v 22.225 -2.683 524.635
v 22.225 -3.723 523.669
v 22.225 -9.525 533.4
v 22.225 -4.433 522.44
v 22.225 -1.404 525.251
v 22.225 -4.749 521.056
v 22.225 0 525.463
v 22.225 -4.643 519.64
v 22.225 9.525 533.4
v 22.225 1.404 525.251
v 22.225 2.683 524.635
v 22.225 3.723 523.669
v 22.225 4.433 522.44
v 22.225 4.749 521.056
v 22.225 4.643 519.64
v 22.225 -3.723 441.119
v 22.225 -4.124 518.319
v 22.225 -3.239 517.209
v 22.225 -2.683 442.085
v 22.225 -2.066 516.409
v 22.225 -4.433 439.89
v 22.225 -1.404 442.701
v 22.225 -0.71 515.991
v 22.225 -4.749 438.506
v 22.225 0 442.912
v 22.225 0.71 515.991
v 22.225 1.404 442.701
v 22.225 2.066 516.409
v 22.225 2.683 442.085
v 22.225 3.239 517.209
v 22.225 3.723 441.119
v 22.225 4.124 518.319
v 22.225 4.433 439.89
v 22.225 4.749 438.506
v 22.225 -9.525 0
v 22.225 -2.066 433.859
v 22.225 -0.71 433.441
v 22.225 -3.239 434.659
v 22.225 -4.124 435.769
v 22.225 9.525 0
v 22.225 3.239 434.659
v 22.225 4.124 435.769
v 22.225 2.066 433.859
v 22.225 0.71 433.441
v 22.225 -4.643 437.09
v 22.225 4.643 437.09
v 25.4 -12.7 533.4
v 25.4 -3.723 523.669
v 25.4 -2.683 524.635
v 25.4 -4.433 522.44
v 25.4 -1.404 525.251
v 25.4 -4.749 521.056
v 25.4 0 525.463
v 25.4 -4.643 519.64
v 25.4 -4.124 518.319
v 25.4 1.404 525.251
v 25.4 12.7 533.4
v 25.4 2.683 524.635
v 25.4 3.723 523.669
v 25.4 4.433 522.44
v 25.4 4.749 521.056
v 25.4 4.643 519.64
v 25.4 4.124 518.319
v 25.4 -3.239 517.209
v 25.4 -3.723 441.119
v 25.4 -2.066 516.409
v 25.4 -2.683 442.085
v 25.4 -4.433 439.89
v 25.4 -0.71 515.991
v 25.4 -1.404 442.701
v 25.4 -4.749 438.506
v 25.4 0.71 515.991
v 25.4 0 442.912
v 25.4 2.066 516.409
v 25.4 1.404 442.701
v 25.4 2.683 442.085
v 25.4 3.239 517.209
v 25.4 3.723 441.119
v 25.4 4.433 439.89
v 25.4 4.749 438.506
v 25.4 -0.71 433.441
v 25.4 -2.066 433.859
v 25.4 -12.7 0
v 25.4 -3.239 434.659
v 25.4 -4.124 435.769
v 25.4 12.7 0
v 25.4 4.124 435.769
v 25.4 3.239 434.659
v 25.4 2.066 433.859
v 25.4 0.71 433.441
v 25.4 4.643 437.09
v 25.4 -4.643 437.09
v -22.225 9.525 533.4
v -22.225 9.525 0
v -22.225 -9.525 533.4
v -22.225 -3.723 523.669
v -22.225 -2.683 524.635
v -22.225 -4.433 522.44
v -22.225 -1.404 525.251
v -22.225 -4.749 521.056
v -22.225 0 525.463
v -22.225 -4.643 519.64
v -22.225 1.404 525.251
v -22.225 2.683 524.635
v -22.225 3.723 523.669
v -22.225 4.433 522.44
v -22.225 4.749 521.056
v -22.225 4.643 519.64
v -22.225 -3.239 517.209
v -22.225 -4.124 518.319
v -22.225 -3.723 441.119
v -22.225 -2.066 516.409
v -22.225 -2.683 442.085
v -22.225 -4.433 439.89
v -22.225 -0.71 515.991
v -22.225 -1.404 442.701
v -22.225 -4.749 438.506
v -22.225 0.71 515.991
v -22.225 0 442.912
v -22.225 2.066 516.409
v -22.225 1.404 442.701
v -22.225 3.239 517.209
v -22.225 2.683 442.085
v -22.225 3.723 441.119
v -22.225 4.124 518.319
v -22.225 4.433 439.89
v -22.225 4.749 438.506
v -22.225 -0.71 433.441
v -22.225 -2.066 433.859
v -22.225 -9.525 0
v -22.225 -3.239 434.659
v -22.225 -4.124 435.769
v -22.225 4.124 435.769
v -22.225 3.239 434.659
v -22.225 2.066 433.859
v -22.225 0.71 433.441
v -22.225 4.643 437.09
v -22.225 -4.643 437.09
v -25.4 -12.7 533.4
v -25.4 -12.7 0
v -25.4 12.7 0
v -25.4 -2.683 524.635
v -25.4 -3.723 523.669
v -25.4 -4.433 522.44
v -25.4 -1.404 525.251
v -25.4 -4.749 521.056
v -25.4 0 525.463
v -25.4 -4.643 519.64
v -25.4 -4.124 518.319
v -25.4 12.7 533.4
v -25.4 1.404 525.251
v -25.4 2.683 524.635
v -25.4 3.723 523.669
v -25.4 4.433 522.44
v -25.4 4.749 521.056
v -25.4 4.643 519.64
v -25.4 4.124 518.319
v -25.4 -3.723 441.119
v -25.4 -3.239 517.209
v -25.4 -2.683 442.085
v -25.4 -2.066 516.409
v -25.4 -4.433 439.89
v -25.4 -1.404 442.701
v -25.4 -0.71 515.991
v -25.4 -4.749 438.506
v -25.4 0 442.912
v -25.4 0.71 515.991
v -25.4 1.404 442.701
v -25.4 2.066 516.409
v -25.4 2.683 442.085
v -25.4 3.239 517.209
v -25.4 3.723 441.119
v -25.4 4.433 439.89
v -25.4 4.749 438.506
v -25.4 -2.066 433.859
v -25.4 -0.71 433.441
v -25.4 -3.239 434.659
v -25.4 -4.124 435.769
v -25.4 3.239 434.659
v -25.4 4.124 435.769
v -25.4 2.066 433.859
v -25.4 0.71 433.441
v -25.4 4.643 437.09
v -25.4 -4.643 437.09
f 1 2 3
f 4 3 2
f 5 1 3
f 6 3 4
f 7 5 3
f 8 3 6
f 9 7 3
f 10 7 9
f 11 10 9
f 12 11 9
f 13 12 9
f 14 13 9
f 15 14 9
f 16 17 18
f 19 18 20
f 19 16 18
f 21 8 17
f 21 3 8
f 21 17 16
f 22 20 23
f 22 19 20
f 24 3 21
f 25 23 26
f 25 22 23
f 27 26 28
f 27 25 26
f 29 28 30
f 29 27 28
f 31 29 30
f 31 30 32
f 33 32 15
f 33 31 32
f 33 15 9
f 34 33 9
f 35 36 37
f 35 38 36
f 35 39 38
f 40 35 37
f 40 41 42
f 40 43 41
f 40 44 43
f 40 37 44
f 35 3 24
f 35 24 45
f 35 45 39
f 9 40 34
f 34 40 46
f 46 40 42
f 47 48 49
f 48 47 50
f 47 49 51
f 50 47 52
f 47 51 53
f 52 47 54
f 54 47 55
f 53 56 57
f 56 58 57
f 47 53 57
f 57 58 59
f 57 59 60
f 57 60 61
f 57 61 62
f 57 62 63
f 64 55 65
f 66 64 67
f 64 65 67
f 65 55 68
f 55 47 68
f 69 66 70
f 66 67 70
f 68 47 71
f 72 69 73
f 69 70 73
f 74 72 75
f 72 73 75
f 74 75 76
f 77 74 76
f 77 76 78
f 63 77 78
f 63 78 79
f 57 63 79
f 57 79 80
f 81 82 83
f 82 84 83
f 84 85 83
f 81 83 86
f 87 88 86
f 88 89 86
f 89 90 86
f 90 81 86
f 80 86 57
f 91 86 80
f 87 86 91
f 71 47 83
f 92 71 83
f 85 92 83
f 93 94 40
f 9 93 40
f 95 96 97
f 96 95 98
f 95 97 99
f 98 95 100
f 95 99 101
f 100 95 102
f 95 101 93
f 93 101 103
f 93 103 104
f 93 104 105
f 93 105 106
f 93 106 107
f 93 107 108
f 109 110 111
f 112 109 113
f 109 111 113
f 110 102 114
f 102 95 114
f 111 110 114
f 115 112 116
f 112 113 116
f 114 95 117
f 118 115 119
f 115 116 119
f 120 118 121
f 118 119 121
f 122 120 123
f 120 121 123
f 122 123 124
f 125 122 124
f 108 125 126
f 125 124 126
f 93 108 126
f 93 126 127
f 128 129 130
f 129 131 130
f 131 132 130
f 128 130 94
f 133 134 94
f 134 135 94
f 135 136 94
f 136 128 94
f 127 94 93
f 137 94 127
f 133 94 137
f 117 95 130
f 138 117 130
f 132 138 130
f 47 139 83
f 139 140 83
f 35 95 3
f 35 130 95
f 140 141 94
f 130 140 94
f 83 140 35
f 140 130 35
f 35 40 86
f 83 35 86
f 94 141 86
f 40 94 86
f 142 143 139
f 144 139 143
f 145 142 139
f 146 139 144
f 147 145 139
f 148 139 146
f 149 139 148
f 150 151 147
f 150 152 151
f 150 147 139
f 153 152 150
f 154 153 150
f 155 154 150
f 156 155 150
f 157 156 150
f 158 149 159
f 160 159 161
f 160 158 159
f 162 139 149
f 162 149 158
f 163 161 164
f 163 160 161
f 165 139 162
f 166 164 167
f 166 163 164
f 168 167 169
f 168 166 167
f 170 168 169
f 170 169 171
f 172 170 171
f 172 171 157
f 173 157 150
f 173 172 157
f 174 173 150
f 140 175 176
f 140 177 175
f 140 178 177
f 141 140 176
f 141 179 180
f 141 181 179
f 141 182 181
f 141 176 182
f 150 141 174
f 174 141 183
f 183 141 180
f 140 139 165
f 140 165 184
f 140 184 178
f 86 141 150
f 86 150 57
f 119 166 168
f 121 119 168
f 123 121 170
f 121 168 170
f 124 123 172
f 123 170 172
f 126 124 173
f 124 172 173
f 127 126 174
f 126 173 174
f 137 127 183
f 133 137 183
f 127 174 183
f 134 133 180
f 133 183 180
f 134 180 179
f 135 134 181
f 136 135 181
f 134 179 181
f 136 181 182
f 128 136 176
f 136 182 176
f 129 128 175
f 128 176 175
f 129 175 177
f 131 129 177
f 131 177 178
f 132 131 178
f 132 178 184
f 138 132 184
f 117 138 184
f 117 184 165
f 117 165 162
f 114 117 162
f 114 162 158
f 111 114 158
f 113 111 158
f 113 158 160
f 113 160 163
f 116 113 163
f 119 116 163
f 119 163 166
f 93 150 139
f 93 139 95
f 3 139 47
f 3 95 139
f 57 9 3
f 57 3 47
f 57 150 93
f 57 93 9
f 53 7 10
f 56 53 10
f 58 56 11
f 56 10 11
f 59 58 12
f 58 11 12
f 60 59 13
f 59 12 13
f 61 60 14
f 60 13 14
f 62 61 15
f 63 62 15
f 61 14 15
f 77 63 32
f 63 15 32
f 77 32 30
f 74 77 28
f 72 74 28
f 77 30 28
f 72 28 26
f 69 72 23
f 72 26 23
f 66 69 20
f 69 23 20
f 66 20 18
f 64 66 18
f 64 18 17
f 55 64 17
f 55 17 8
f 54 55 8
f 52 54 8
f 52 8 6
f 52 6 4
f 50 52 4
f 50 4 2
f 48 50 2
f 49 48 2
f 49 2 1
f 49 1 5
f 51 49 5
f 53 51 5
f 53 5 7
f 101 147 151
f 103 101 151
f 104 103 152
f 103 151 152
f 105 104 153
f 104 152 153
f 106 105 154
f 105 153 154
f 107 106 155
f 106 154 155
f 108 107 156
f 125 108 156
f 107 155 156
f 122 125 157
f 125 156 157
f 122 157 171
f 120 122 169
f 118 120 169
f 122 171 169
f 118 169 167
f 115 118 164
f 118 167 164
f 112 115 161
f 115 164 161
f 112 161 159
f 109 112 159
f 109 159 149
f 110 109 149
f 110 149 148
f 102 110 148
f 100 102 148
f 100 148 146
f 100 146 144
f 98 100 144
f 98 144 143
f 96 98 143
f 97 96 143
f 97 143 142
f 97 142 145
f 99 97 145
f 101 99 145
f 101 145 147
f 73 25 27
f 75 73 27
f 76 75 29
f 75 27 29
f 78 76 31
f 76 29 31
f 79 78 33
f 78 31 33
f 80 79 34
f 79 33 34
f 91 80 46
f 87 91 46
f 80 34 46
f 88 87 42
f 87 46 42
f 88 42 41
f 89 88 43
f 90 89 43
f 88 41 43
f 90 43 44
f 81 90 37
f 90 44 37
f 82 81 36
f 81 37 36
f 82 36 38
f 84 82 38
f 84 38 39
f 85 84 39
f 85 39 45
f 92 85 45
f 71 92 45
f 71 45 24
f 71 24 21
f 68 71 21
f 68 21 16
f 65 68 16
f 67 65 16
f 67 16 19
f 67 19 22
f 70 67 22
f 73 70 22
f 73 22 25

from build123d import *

# Parameters (mm, degrees)
SKETCH1_W           = 50.8
SKETCH1_H           = 25.4
SKETCH1_W_2         = 44.45
SKETCH1_H_2         = 19.05
BOSS_EXTRUDE1_DEPTH = 457.2
SKETCH2_R           = 4.7625
CUT_EXTRUDE1_DEPTH  = 461.188841673
SKETCH3_W           = 50.8
SKETCH3_H           = 25.4
SKETCH3_W_2         = 44.45
SKETCH3_H_2         = 19.05
BOSS_EXTRUDE2_DEPTH = 76.2
SKETCH4_R           = 4.7625
CUT_EXTRUDE2_DEPTH  = 536.964075289


with BuildPart() as part:
    # Sketch1 → Boss-Extrude1 (new body)
    with BuildSketch(Plane.XY):
        Rectangle(SKETCH1_W, SKETCH1_H)
        Rectangle(SKETCH1_W_2, SKETCH1_H_2, mode=Mode.SUBTRACT)
    extrude(amount=BOSS_EXTRUDE1_DEPTH)

    # Sketch2 → Cut-Extrude1 (cut, through all)
    with BuildSketch(Plane.ZY.offset(25.4)):
        with Locations((438.15, 0)):
            Circle(SKETCH2_R)
    extrude(amount=-CUT_EXTRUDE1_DEPTH, mode=Mode.SUBTRACT)

    # Sketch3 → Boss-Extrude2 (add)
    with BuildSketch(Plane.XY.offset(457.2)):
        Rectangle(SKETCH3_W, SKETCH3_H)
        Rectangle(SKETCH3_W_2, SKETCH3_H_2, mode=Mode.SUBTRACT)
    extrude(amount=BOSS_EXTRUDE2_DEPTH)

    # Sketch4 → Cut-Extrude2 (cut, through all)
    with BuildSketch(Plane.ZY.offset(25.4)):
        with Locations((520.7, 0)):
            Circle(SKETCH4_R)
    extrude(amount=-CUT_EXTRUDE2_DEPTH, mode=Mode.SUBTRACT)


solid = part.part
